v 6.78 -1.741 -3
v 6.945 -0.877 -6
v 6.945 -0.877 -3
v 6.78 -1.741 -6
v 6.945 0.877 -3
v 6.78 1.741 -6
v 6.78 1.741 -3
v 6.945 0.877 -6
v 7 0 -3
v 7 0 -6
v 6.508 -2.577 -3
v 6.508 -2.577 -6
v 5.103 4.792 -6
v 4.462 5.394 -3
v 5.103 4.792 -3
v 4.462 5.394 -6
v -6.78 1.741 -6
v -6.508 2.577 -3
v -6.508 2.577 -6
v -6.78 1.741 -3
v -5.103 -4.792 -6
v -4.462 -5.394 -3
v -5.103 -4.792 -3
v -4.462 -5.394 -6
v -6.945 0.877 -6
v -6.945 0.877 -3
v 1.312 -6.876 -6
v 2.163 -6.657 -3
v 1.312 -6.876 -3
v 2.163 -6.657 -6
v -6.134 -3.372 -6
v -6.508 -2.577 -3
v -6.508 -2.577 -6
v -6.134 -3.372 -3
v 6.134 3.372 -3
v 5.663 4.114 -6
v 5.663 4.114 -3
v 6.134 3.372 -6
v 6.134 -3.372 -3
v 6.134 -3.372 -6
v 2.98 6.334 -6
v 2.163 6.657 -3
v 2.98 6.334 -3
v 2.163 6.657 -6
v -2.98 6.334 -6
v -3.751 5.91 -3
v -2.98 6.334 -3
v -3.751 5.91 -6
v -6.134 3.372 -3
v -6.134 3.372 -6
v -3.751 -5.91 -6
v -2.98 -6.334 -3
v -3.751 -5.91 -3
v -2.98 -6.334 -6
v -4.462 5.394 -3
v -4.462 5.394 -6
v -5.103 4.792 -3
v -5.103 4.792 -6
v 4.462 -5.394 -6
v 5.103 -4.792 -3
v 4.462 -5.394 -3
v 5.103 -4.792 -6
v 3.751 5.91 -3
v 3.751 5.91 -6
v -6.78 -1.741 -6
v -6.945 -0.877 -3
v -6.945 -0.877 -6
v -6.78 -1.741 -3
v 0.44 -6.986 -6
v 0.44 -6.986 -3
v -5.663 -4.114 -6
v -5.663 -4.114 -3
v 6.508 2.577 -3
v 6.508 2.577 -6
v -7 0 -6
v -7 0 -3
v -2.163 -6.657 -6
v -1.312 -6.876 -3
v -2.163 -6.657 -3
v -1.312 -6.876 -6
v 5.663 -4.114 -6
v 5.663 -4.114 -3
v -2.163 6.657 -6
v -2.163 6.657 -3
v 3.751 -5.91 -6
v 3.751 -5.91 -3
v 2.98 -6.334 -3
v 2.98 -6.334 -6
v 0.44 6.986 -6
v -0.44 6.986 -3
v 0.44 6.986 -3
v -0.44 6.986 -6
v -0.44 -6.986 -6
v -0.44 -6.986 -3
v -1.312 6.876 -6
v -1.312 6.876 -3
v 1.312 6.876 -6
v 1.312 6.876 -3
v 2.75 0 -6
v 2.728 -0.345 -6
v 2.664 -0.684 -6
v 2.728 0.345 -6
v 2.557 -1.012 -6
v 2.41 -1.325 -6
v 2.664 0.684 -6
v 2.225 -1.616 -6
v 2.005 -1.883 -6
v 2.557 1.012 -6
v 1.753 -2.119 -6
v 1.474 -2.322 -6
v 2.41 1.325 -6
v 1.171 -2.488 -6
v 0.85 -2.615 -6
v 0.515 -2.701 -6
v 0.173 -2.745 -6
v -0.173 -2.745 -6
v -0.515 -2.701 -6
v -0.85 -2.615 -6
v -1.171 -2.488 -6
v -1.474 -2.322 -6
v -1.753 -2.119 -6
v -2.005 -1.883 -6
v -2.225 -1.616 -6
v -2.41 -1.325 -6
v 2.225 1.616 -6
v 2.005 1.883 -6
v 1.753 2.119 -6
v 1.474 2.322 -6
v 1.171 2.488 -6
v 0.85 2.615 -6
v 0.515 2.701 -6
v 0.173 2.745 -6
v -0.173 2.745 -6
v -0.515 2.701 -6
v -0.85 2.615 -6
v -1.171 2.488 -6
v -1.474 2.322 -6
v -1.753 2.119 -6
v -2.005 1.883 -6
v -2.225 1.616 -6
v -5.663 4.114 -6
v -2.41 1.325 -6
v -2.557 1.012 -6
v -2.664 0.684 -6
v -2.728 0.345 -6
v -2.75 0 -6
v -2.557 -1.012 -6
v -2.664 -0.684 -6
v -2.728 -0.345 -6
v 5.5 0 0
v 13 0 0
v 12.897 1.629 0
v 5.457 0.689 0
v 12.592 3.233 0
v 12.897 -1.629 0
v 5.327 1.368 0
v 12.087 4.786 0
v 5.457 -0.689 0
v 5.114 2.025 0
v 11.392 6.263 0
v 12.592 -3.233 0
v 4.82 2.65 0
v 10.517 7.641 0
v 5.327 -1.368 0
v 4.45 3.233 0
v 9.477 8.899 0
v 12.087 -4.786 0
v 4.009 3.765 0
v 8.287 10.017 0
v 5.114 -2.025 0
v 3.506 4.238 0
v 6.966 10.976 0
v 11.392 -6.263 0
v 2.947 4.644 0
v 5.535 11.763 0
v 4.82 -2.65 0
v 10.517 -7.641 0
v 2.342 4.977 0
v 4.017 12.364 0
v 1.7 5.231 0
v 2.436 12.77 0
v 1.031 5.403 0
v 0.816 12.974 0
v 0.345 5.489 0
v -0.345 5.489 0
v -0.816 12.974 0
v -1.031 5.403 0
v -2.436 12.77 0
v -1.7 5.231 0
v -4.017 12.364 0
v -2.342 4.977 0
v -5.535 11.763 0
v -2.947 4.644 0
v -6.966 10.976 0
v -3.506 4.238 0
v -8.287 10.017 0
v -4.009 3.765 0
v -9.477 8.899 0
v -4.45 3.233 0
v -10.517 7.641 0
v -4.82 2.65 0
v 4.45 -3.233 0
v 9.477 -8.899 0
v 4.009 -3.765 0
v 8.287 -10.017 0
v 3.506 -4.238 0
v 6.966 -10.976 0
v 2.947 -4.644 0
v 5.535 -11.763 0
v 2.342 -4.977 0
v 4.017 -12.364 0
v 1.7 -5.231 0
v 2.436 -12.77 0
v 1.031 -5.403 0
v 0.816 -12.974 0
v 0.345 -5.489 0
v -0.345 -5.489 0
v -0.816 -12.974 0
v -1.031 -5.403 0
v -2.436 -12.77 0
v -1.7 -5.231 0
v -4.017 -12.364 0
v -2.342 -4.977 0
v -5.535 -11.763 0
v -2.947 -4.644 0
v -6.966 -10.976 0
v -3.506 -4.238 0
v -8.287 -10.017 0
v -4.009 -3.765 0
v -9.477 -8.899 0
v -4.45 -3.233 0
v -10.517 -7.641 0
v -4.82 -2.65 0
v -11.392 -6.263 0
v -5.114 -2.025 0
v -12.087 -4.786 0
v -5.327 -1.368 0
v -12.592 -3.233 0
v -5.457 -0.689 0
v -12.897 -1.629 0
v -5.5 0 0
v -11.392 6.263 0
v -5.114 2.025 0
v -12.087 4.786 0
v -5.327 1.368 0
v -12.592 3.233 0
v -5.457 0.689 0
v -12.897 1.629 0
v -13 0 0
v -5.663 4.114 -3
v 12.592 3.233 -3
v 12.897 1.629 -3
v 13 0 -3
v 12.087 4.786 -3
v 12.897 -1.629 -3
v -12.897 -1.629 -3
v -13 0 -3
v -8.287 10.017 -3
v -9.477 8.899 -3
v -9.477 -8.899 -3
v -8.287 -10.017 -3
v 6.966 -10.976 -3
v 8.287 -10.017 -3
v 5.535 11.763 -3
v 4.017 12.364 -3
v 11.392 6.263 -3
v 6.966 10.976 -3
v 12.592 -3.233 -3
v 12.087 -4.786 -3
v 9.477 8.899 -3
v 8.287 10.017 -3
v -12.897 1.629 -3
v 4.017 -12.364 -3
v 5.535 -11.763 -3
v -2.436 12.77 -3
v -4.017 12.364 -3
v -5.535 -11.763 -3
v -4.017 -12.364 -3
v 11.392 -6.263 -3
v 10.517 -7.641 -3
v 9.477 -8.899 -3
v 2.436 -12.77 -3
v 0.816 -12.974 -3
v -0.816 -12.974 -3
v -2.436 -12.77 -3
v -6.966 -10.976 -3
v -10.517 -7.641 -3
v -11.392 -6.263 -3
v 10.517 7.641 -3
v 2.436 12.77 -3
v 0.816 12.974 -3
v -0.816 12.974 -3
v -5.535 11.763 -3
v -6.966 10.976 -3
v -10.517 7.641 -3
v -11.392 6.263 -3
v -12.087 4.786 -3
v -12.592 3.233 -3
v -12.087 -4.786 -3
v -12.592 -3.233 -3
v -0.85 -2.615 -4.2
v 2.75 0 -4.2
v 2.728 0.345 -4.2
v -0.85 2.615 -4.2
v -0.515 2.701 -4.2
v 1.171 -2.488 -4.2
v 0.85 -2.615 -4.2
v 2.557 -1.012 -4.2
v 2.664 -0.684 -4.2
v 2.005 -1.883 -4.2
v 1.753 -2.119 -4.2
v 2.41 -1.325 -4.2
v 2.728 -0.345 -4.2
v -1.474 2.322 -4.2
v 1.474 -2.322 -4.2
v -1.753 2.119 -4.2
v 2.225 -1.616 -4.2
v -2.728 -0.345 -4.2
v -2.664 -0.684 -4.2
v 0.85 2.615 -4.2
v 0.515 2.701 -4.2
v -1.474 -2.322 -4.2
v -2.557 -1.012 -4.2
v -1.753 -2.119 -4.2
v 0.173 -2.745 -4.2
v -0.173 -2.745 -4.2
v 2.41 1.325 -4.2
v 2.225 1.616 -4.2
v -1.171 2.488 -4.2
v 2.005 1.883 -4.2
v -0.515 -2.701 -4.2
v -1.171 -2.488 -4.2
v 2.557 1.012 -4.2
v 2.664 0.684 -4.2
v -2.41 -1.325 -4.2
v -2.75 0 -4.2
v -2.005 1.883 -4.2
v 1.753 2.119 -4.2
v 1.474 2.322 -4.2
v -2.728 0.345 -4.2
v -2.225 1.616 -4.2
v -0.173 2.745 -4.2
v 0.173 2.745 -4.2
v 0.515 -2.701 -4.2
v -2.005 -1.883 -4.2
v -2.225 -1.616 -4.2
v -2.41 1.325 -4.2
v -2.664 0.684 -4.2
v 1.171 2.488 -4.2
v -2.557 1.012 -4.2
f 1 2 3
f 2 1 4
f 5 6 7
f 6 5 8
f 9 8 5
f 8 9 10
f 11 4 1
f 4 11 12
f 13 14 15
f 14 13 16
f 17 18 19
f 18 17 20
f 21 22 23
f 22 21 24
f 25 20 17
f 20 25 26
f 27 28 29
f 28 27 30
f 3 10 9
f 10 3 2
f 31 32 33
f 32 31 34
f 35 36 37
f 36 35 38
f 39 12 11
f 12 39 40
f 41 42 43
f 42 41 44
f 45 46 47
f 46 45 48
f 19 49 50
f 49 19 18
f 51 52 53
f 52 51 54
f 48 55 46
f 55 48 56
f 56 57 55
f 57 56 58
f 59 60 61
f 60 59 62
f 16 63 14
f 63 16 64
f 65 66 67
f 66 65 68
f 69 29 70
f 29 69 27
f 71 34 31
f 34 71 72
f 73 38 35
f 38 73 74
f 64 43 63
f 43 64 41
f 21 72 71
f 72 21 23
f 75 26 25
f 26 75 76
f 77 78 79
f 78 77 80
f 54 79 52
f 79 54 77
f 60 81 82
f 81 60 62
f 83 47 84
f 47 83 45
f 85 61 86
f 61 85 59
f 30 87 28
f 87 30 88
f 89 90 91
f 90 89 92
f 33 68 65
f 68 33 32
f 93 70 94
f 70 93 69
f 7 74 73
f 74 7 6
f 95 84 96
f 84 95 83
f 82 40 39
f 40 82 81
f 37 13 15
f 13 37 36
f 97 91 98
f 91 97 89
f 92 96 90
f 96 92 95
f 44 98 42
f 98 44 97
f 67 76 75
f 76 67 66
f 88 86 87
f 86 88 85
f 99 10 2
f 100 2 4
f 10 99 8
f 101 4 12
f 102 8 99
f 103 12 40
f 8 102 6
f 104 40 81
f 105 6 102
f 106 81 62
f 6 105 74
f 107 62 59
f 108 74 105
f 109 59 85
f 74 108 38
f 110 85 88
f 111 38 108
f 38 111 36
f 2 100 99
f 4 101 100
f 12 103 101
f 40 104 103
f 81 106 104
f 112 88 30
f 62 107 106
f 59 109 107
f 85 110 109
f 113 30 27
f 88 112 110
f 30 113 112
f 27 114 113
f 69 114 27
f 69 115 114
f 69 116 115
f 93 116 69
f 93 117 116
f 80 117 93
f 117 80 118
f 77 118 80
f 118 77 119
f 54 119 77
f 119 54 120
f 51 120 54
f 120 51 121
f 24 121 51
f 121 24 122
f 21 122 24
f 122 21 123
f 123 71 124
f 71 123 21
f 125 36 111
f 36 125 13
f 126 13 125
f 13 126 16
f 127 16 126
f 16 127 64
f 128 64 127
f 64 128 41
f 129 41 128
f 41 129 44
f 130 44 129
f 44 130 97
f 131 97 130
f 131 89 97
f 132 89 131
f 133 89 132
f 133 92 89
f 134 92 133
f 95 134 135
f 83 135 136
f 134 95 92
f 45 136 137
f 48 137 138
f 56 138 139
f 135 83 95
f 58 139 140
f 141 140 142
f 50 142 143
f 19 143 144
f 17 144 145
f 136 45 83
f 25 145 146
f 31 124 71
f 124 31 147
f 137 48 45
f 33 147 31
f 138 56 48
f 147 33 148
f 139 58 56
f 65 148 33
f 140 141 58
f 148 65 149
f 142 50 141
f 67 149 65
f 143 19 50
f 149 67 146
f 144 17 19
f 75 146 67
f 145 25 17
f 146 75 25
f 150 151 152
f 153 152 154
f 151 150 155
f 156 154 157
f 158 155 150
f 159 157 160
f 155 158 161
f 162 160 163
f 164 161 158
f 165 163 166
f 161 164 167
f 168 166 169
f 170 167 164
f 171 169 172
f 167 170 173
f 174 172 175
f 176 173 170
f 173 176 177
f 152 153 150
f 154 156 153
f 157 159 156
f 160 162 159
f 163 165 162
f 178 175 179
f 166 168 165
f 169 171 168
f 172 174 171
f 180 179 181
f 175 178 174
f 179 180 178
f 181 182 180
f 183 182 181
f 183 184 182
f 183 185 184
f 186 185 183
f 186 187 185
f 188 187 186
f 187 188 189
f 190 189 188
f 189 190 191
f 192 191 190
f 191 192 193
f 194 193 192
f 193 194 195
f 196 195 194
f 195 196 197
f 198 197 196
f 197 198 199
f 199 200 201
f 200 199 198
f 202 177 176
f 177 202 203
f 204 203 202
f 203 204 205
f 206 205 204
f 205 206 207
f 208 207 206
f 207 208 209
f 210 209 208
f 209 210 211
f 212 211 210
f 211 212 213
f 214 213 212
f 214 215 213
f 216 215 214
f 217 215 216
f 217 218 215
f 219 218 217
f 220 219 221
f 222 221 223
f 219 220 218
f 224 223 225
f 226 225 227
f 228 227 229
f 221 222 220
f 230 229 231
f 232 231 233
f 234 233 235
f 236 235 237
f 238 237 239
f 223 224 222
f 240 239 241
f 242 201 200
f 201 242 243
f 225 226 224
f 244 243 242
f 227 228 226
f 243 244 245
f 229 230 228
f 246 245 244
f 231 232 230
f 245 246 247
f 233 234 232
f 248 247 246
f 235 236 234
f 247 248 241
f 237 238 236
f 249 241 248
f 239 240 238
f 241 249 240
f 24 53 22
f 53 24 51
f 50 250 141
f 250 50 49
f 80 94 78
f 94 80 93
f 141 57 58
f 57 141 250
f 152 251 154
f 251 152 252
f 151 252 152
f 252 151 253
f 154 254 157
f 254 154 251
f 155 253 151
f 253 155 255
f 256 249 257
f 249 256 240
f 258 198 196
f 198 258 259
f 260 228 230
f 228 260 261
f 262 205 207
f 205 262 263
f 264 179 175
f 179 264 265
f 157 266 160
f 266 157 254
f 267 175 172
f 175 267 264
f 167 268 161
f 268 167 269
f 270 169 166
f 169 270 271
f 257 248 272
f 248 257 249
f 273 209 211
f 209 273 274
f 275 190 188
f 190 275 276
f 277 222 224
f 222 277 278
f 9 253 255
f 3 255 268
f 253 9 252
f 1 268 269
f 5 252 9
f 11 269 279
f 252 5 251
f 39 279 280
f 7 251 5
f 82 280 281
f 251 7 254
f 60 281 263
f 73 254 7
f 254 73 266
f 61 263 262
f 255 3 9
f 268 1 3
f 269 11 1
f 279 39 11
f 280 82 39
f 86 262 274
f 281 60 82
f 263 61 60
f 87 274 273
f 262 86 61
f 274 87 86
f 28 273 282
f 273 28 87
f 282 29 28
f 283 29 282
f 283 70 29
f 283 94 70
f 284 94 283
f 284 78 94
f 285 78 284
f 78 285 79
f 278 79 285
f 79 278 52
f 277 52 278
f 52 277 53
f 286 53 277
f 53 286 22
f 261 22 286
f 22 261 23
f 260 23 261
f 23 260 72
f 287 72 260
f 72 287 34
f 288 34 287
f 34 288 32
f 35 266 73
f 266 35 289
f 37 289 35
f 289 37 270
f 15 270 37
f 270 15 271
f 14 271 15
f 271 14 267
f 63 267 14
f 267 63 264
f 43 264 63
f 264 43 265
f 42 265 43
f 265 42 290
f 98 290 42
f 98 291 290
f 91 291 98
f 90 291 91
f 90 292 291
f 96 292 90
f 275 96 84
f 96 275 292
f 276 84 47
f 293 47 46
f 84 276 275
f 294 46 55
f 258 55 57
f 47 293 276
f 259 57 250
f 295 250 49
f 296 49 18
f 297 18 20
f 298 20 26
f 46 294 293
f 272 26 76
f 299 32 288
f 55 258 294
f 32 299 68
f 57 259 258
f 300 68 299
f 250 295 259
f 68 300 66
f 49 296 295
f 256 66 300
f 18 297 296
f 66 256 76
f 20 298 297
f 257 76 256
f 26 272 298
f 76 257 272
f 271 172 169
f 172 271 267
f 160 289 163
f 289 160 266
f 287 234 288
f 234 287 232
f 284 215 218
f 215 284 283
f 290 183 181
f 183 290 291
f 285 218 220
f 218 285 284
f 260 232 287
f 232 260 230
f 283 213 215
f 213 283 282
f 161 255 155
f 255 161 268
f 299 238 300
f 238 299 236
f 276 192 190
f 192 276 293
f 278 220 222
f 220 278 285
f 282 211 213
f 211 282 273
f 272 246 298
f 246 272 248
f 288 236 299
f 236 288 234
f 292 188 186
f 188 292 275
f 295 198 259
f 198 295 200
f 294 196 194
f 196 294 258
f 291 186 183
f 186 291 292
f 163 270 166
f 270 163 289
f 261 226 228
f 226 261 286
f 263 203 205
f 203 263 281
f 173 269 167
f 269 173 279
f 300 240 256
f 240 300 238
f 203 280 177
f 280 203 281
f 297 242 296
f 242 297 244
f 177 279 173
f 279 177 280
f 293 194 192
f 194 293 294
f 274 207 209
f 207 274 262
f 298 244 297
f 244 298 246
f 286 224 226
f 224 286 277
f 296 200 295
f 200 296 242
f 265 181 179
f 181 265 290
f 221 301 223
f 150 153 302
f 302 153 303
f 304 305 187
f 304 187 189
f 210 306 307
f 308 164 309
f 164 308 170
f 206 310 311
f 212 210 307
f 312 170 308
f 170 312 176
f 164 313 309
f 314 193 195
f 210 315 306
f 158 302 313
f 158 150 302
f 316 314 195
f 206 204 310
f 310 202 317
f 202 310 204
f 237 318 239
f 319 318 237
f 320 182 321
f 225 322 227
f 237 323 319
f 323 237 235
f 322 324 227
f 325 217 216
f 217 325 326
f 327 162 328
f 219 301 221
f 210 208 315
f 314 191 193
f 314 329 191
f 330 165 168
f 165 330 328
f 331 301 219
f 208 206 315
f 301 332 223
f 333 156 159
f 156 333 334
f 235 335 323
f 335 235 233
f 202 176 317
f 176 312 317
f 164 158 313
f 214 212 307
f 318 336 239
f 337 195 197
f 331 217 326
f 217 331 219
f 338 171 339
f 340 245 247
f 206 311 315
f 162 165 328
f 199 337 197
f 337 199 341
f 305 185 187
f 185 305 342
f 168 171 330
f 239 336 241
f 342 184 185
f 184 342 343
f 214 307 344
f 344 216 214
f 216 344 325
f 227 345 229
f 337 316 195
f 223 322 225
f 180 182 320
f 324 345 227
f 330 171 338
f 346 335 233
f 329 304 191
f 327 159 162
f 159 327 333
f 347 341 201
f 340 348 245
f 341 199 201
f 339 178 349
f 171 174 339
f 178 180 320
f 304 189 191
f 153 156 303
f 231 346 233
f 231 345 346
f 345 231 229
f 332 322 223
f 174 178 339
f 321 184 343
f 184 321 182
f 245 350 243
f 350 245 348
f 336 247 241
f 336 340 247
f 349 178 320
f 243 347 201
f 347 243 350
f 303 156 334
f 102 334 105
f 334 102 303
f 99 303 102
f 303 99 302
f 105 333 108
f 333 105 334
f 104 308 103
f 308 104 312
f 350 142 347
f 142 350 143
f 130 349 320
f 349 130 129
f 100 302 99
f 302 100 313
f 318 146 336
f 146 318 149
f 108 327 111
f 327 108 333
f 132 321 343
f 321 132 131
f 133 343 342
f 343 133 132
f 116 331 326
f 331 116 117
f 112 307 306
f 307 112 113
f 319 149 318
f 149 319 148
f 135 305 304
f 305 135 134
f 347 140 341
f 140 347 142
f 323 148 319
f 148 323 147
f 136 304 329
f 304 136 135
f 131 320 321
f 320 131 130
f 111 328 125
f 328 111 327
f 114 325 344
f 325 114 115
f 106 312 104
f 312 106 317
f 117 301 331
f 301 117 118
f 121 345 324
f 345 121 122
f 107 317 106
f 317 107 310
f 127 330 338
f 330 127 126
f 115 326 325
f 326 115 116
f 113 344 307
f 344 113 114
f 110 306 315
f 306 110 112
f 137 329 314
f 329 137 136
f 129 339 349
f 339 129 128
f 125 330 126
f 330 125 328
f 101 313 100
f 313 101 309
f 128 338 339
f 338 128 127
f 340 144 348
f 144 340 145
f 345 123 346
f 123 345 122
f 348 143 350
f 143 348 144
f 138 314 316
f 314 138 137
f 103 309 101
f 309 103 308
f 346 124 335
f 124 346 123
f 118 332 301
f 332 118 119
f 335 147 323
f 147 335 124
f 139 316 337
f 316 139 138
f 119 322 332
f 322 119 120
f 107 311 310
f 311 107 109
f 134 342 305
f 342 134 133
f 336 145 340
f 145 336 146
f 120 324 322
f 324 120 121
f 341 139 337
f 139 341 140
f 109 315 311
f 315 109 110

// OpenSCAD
$fn = 50;


difference() {
	union() {
		translate(v = [0, 0, -6.0000000000]) {
			cylinder(h = 6, r = 7.0000000000);
		}
		translate(v = [0, 0, -3.0000000000]) {
			cylinder(h = 3, r = 13.0000000000);
		}
	}
	union() {
		translate(v = [0, 0, 0]) {
			rotate(a = [0, 0, 0]) {
				difference() {
					union() {
						#translate(v = [0, 0, -6.0000000000]) {
							cylinder(h = 6, r = 2.2500000000);
						}
						#translate(v = [0, 0, -4.2000000000]) {
							cylinder(h = 4.2000000000, r = 7.0000000000, r1 = 2.7500000000, r2 = 5.5000000000);
						}
						#translate(v = [0, 0, -6.0000000000]) {
							cylinder(h = 6, r = 2.7500000000);
						}
						#translate(v = [0, 0, -6.0000000000]) {
							cylinder(h = 6, r = 2.2500000000);
						}
					}
					union();
				}
			}
		}
	}
}
